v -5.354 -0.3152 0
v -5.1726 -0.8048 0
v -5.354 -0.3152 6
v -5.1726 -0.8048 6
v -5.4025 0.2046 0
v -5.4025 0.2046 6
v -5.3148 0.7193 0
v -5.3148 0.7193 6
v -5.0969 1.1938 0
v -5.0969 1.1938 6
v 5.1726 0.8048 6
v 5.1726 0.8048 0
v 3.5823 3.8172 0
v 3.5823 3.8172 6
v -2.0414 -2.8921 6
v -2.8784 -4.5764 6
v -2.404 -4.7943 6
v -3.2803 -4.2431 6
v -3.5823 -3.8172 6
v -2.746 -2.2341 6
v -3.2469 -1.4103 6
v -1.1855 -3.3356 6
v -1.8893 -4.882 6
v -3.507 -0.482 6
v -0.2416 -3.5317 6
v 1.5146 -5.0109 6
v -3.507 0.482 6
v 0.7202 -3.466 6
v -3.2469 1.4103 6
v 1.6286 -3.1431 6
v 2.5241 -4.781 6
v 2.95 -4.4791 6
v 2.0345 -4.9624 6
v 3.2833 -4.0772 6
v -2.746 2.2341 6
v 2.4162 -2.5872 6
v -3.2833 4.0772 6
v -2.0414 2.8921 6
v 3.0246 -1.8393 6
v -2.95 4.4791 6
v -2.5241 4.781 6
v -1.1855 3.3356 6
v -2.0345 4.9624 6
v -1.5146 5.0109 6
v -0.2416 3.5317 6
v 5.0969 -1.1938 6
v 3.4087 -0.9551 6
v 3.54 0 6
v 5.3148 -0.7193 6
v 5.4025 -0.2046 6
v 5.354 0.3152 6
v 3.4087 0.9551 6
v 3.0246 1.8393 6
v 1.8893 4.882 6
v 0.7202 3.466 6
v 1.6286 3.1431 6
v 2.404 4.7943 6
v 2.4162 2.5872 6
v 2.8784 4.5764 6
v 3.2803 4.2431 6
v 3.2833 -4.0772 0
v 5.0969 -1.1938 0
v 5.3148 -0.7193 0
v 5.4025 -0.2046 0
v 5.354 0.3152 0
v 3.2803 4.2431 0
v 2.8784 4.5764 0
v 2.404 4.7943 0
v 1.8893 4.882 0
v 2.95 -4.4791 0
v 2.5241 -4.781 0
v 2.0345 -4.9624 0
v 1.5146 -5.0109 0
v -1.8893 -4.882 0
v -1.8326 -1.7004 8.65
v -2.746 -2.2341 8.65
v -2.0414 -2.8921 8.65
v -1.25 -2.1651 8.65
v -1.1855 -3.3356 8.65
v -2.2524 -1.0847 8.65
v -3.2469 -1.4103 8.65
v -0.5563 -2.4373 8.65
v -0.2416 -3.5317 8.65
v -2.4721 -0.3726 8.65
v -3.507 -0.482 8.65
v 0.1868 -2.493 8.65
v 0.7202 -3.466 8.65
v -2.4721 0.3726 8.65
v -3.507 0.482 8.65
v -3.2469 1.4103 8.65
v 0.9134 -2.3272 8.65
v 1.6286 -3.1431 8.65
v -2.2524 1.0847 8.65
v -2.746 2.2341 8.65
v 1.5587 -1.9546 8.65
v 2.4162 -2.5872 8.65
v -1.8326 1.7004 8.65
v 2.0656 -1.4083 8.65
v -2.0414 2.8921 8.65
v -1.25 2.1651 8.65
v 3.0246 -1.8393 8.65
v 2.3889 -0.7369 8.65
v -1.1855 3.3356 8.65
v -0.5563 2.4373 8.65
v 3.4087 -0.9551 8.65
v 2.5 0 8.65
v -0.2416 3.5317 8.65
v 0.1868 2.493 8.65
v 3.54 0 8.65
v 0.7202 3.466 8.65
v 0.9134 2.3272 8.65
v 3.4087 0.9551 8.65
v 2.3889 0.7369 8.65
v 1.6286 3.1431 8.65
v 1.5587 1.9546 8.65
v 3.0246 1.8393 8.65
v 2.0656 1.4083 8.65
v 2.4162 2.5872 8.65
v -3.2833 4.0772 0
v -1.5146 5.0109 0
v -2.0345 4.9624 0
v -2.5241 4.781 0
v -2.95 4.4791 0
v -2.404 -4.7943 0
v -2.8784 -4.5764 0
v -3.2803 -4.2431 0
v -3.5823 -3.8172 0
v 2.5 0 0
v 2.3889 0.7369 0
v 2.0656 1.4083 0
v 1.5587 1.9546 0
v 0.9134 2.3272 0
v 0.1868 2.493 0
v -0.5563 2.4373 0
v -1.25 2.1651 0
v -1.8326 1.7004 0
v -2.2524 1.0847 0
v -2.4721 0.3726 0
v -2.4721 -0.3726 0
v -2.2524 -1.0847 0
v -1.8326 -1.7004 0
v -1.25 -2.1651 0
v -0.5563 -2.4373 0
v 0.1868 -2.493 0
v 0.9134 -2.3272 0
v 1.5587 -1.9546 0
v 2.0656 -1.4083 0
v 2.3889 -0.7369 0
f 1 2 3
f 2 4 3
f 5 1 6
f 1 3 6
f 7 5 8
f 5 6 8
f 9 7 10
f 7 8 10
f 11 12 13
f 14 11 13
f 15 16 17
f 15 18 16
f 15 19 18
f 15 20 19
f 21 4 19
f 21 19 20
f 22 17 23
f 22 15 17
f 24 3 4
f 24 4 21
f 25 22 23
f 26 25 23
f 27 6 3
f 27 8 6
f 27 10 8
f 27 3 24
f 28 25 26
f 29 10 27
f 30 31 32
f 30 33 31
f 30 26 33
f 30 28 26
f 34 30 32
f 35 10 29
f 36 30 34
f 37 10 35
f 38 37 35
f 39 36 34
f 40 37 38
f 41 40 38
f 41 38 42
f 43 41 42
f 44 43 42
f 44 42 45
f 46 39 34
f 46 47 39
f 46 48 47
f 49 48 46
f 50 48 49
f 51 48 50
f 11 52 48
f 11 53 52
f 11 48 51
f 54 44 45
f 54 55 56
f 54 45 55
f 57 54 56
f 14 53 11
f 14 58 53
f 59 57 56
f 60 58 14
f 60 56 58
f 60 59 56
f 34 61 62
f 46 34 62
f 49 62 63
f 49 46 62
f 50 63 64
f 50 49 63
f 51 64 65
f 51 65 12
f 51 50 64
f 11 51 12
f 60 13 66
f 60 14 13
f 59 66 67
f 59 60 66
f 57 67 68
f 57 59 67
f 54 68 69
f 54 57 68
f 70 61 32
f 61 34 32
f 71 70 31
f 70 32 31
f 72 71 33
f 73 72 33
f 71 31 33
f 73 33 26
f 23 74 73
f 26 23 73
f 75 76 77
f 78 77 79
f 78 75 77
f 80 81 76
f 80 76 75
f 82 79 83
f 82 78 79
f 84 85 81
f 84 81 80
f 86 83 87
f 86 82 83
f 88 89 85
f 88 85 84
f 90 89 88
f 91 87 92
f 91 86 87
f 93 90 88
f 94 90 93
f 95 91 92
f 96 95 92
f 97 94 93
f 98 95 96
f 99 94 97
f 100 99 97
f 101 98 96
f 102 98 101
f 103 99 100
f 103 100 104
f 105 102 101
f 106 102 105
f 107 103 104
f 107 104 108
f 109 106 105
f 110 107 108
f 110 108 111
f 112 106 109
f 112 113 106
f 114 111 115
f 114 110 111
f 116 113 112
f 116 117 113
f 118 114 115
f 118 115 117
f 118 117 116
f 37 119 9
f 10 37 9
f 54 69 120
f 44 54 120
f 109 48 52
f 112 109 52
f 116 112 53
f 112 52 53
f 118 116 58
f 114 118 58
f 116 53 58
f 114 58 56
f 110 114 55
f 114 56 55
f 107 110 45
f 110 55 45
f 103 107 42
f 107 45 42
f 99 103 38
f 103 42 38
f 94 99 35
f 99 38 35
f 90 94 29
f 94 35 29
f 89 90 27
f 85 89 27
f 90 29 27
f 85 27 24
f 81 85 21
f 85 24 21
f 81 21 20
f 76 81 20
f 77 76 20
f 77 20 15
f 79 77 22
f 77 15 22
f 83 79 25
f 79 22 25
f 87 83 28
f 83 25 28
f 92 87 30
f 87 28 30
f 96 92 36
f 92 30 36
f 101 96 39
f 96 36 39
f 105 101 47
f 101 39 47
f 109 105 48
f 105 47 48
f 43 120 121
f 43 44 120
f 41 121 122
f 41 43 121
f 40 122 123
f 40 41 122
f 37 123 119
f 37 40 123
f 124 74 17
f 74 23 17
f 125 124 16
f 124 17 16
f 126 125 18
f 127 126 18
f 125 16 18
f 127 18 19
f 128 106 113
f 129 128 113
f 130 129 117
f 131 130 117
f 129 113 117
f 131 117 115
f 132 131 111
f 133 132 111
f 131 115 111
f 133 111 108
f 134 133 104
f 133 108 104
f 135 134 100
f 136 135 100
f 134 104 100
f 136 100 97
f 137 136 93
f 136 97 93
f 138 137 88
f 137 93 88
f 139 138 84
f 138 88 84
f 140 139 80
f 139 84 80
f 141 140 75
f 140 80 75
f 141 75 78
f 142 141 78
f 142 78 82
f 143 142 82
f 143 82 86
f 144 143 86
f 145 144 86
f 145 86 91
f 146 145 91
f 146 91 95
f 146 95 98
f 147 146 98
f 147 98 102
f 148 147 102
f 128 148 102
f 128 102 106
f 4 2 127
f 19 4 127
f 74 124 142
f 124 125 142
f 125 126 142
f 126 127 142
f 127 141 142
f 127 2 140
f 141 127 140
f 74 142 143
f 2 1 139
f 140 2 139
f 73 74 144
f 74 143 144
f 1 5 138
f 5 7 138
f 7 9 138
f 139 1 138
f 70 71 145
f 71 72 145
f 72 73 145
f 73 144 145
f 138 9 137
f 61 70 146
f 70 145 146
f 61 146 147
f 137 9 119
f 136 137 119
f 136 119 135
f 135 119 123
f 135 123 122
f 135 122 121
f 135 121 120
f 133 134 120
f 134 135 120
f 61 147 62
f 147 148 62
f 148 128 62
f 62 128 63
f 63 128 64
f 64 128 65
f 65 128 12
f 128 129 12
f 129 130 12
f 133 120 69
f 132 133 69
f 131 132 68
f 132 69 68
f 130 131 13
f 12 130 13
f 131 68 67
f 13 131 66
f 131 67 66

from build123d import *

# Parameters (mm, degrees)
F1_DEPTH = 6
F2_R     = 3.54
F3_DEPTH = 2.65
F4_R     = 2.5
F5_DEPTH = 25
F6_R     = 2


with BuildPart() as f1:
    # F0 (on Top) → F1 (new body)
    with BuildSketch(Plane.XY):
        Polygon((2.6685, -5.054613), (5.711673, -0.216318), (3.043173, 4.838295), (-2.6685, 5.054613), (-5.711673, 0.216318), (-3.043173, -4.838295), align=None)
    extrude(amount=F1_DEPTH)

    # F2 (on face) → F3 (join)
    with BuildSketch(Plane.XY.offset(6)):
        Circle(F2_R)
    extrude(amount=F3_DEPTH)

    # F4 (on face) → F5 (cut)
    with BuildSketch(Plane.XY.offset(8.65)):
        Circle(F4_R)
    extrude(amount=-F5_DEPTH, mode=Mode.SUBTRACT)

    # F6
    f6_edges = [f1.edges().sort_by_distance(p)[0] for p in [
        (2.6685, -5.054613, 3),
        (5.711673, -0.216318, 3),
        (-3.043173, -4.838295, 3),
        (-5.711673, 0.216318, 3),
        (-2.6685, 5.054613, 3),
        (3.043173, 4.838295, 3),
    ]]
    fillet(f6_edges, radius=F6_R)


solid = f1.part
